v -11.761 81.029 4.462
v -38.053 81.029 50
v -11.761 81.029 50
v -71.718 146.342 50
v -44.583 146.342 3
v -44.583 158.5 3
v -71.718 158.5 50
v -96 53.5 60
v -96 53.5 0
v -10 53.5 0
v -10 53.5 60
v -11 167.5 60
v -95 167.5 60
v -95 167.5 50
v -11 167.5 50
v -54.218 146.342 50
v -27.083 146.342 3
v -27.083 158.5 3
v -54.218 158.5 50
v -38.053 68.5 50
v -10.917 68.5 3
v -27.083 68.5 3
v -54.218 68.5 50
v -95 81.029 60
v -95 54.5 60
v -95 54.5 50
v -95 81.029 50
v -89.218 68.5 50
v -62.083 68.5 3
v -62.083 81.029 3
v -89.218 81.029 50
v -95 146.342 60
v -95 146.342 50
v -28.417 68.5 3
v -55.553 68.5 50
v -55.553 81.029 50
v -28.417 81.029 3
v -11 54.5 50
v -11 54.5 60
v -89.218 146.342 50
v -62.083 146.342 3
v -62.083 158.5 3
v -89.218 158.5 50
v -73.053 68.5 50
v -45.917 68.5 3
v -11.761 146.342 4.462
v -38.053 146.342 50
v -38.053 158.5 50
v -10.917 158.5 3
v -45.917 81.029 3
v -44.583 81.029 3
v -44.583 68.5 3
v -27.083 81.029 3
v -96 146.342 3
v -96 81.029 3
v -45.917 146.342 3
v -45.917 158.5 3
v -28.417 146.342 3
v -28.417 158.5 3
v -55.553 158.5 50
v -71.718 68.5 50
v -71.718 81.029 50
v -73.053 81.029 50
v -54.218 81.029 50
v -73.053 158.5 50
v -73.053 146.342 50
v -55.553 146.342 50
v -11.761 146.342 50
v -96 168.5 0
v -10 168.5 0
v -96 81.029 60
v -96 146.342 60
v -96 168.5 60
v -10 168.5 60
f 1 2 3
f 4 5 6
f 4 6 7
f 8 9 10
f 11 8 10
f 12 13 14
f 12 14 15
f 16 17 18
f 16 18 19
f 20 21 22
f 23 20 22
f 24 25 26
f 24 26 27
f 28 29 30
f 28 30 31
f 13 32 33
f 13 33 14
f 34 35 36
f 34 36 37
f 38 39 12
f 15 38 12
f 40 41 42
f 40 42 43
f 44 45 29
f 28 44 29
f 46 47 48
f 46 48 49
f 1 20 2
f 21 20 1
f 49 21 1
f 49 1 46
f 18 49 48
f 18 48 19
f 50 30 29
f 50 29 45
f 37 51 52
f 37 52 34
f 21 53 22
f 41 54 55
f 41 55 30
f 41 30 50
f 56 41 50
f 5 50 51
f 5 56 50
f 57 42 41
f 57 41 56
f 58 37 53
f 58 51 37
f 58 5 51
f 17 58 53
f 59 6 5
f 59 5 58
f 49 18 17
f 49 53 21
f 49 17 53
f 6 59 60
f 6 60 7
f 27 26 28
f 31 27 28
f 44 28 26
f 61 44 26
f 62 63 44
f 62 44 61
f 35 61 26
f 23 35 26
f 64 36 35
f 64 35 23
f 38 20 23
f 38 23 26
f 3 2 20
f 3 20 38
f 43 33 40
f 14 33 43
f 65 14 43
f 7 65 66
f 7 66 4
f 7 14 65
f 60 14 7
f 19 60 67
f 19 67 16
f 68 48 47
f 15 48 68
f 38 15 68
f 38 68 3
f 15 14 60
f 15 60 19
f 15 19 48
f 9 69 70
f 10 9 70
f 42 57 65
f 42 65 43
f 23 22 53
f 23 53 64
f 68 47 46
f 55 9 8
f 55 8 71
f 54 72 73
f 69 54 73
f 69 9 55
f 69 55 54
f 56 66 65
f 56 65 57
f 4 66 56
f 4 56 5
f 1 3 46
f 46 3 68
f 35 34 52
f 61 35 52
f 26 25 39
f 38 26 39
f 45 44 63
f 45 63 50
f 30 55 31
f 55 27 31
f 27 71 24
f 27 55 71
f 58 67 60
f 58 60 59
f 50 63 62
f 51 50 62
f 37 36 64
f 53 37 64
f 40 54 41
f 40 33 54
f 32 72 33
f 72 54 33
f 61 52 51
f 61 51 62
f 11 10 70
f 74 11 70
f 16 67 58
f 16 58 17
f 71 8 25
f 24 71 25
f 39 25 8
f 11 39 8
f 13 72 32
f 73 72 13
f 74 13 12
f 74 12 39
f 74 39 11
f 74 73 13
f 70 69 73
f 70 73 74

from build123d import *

# Parameters (mm, degrees)
SKETCH018_W            = 86
SKETCH018_H            = 115
PAD009_DEPTH           = 60
POCKET008_DEPTH        = 90
LINEARPATTERN005_COUNT = 3
LINEARPATTERN005_PITCH = 17.5
SKETCH020_W            = 84
SKETCH020_H            = 113
POCKET009_DEPTH        = 10
SKETCH021_W            = 84.35487
SKETCH021_H            = 65.313143
POCKET010_DEPTH        = 57


with BuildPart() as part:
    # Sketch018 → Pad009 (new body)
    with BuildSketch(Plane.XY):
        Rectangle(SKETCH018_W, SKETCH018_H)
    extrude(amount=PAD009_DEPTH)

    # Sketch019 (on DatumPlane) → Pocket008 (cut)
    with BuildSketch(Plane(origin=(34, -42.5, 3), x_dir=(1, 0, 0), z_dir=(0, -1, 0))):
        Polygon((-40.082904, 55.425626), (-23.917096, 55.425626), (8.082904, 0), (-8.082904, 0), align=None)
    pocket008 = extrude(amount=-POCKET008_DEPTH, mode=Mode.SUBTRACT)

    # LinearPattern005: Pocket008 ×3
    with Locations(*[(-i * LINEARPATTERN005_PITCH, 0, 0) for i in range(1, LINEARPATTERN005_COUNT)]):
        add(pocket008, mode=Mode.SUBTRACT)

    # Sketch020 (on DatumPlane) → Pocket009 (cut)
    with BuildSketch(Plane.XY.offset(60)):
        Rectangle(SKETCH020_W, SKETCH020_H)
    extrude(amount=-POCKET009_DEPTH, mode=Mode.SUBTRACT)

    # Sketch021 (on DatumPlane) → Pocket010 (cut)
    with BuildSketch(Plane.XY.offset(60)):
        with Locations((-0.938883, 2.685085)):
            Rectangle(SKETCH021_W, SKETCH021_H)
    extrude(amount=-POCKET010_DEPTH, mode=Mode.SUBTRACT)


with BuildPart() as part_1:
    # Body007 placement: moved
    add(part.part.moved(Location((-53, 111, 0))))


solid = part_1.part
